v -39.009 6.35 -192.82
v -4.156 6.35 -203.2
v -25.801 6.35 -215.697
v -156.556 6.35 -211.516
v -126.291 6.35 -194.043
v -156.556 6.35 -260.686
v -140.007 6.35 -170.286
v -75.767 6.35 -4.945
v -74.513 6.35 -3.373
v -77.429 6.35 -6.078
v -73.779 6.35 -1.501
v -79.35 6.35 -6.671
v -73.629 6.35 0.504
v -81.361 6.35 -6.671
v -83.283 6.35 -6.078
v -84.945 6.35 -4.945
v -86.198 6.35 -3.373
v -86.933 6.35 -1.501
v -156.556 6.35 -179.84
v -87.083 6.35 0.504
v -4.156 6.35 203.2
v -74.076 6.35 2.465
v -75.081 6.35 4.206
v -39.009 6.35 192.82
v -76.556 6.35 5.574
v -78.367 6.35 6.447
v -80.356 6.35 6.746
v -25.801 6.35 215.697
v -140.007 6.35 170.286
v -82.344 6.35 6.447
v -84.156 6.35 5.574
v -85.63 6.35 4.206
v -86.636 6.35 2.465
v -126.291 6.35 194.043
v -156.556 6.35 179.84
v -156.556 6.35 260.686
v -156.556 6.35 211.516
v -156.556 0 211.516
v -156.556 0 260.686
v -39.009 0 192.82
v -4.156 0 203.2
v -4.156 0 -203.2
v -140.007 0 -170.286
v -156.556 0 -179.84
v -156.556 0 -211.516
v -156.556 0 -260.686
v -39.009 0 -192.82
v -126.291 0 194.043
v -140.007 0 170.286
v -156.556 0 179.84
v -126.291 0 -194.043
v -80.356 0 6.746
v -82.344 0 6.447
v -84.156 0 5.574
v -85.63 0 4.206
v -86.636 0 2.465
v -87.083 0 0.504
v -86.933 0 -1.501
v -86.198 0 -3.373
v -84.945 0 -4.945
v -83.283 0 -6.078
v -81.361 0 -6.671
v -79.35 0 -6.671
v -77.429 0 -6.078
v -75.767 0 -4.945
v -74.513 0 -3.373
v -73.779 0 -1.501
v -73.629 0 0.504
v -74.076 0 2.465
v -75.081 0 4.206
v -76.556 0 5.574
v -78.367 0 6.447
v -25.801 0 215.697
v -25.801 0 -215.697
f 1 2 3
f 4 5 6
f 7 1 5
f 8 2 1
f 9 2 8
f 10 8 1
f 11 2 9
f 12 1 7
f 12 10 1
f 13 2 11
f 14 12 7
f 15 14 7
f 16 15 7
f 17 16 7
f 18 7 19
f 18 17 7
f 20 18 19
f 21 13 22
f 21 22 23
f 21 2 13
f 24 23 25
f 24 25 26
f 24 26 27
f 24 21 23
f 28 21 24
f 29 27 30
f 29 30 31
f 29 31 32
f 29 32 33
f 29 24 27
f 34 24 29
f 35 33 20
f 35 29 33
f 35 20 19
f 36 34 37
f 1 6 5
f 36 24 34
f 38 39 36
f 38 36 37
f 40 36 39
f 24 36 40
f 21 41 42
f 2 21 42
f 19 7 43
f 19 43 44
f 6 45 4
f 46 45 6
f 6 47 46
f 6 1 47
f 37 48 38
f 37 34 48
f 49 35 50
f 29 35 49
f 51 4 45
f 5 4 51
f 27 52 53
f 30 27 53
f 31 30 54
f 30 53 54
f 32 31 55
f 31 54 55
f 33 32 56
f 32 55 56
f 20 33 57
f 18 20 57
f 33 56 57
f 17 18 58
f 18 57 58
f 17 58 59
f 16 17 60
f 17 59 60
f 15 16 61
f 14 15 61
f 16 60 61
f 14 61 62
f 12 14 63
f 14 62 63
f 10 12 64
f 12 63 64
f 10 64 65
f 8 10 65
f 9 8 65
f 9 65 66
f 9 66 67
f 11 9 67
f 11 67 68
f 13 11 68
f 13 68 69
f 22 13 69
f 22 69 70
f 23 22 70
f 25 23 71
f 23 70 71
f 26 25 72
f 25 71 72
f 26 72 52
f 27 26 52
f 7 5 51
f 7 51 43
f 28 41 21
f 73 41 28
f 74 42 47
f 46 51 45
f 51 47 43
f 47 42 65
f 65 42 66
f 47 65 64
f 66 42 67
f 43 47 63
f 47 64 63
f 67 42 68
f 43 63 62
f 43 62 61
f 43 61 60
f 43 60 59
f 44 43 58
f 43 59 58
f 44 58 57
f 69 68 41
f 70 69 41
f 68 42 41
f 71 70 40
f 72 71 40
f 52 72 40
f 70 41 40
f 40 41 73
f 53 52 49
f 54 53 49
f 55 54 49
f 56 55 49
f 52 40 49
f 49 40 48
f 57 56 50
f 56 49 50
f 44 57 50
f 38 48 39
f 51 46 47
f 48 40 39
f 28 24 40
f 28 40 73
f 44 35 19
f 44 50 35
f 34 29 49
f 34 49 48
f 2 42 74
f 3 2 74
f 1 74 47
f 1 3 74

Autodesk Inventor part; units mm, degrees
ref_plane "YZ Plane" through (0, 0, 0) normal (1, 0, 0) x (0, 1, 0)
ref_plane "XZ Plane" through (0, 0, 0) normal (0, 1, 0) x (-1, 0, 0)
ref_plane "XY Plane" through (0, 0, 0) normal (0, 0, 1) x (1, 0, 0)
sketch "Sketch1" plane through (0, 0, 0) normal (0, 1, 0) x (-1, 0, 0)
  line L0 (4.1559, 203.2) -> (4.1559, -203.2)
  line L1 (4.1559, -203.2) -> (156.5559, -291.1882)
  line L2 (4.1559, 203.2) -> (156.5559, 291.1882)
  line L3 (4.1559, 203.2) -> (180.1322, 203.2) construction
  line L4 (156.5559, 291.1882) -> (156.5559, -291.1882)
  point P0 (0, 0)
  point P1 (4.1559, 0)
  dimension "d0" = 120
  dimension "d1" = 30
  dimension "d2" = 406.4
  dimension "d5" = 152.4
extrude "Extrusion1" add sketch "Sketch1" along normal blind 6.35
sketch "Sketch4" plane through (0, 6.35, 0) normal (0, 1, 0) x (1, 0, 0)
  line L0 (-4.1559, -203.2) -> (-4.1559, 203.2) projected
  point P0 (0, 0)
  point P1 (-80.3559, 0)
  dimension "d12" = 76.2
  dimension "d13" = 203.2
hole "Hole1" at (-80.3559, 6.35, 0) direction (0, -1, 0) diameter 13.4925 end through all
sketch "Sketch5" plane through (0, 6.35, 0) normal (0, 1, 0) x (1, 0, 0)
  line L0 (-1271.2154, -905.4078) -> (-39.3808, -194.2078) projected
  line L1 (-1258.5154, -927.4048) -> (-1271.2154, -905.4078) projected
  line L2 (-1258.5154, -927.4048) -> (-26.6808, -216.2048) projected
  line L3 (-39.3808, -194.2078) -> (-26.6808, -216.2048) projected
  circle A0 centre (-1049.6741, -711.3284) radius 3.3782 projected
  circle A1 centre (-248.9471, -249.0284) radius 3.3782 projected
  circle A2 centre (-318.2291, -289.0284) radius 3.3782 projected
  circle A3 centre (-1118.9562, -751.3284) radius 3.3782 projected
  line L4 (-127.679, -193.6709) -> (-1227.5312, -828.6709) projected
  line L5 (-140.379, -171.6739) -> (-127.679, -193.6709) projected
  line L6 (-140.379, -171.6739) -> (-1240.2312, -806.6739) projected
  line L7 (-1227.5312, -828.6709) -> (-1240.2312, -806.6739) projected
  circle A4 centre (-318.2291, 289.0284) radius 3.3782 projected
  circle A5 centre (-1118.9562, 751.3284) radius 3.3782 projected
  circle A6 centre (-1049.6741, 711.3284) radius 3.3782 projected
  circle A7 centre (-248.9471, 249.0284) radius 3.3782 projected
  line L8 (-1227.5312, 828.6709) -> (-127.679, 193.6709) projected
  line L9 (-1240.2312, 806.6739) -> (-1227.5312, 828.6709) projected
  line L10 (-1240.2312, 806.6739) -> (-140.379, 171.6739) projected
  line L11 (-127.679, 193.6709) -> (-140.379, 171.6739) projected
  line L12 (-39.3808, 194.2078) -> (-1271.2154, 905.4078) projected
  line L13 (-26.6808, 216.2048) -> (-39.3808, 194.2078) projected
  line L14 (-26.6808, 216.2048) -> (-1258.5154, 927.4048) projected
  line L15 (-1271.2154, 905.4078) -> (-1258.5154, 927.4048) projected
  line L16 (-156.5559, -291.1882) -> (-26.6808, -216.2048)
  line L17 (-39.3808, -194.2078) -> (-156.5559, -261.8588)
  line L18 (-156.5559, 291.1882) -> (-156.5559, -291.1882) projected
  line L19 (-156.5559, -261.8588) -> (-156.5559, -291.1882)
  line L20 (-156.5559, -210.343) -> (-127.679, -193.6709)
  line L21 (-127.679, -193.6709) -> (-140.379, -171.6739)
  line L22 (-140.379, -171.6739) -> (-156.5559, -181.0136)
  line L23 (-156.5559, -181.0136) -> (-156.5559, -210.343)
  line L24 (-39.3808, -194.2078) -> (-26.6808, -216.2048)
  line L25 (-156.5559, 181.0136) -> (-140.379, 171.6739)
  line L26 (-140.379, 171.6739) -> (-127.679, 193.6709)
  line L27 (-127.679, 193.6709) -> (-156.5559, 210.343)
  line L28 (-156.5559, 210.343) -> (-156.5559, 181.0136)
  line L29 (-156.5559, 261.8588) -> (-39.3808, 194.2078)
  line L30 (-39.3808, 194.2078) -> (-26.6808, 216.2048)
  line L31 (-4.1559, 203.2) -> (-156.5559, 291.1882) projected
  line L32 (-26.6808, 216.2048) -> (-156.5559, 291.1882)
  line L33 (-156.5559, 291.1882) -> (-156.5559, 261.8588)
  line L34 (-156.5559, 291.1882) -> (-26.6808, 216.2048)
  line L35 (-25.293, -216.5767) -> (-157.5719, -292.9479)
  line L36 (-157.5719, -292.9479) -> (-157.5719, -261.2722)
  line L37 (-157.5719, -261.2722) -> (-39.009, -192.8199)
  line L38 (-39.009, -192.8199) -> (-25.293, -216.5767)
  line L39 (-126.2911, -194.0428) -> (-157.5719, -212.1027)
  line L40 (-157.5719, -212.1027) -> (-157.5719, -180.427)
  line L41 (-157.5719, -180.427) -> (-140.0071, -170.286)
  line L42 (-140.0071, -170.286) -> (-126.2911, -194.0428)
  line L43 (-140.0071, 170.286) -> (-157.5719, 180.427)
  line L44 (-157.5719, 180.427) -> (-157.5719, 212.1027)
  line L45 (-157.5719, 212.1027) -> (-126.2911, 194.0428)
  line L46 (-126.2911, 194.0428) -> (-140.0071, 170.286)
  line L47 (-25.801, 215.6968) -> (-39.009, 192.8199)
  line L48 (-39.009, 192.8199) -> (-157.5719, 261.2722)
  line L49 (-157.5719, 261.2722) -> (-157.5719, 291.1882)
  line L50 (-25.801, 215.6968) -> (-156.5559, 291.1882)
  line L51 (-157.5719, 291.1882) -> (-157.5719, 291.7748)
  line L52 (-157.5719, 291.7748) -> (-156.5559, 291.1882)
  point P0 (0, 0)
  dimension "d22" = 1.016
  dimension "d23" = 1.016
  dimension "d24" = 1.016
  dimension "d25" = 1.016
extrude "Extrusion3" cut sketch "Sketch5" against normal blind 25.4 contours L18 L37 L38 L35 L36 L2 L3 L0 | L18 L2 L36 L0 | L0 L3 L2 L18 | L0 L36 L37 L18 | L36 L2 L1 L0 | L48 L49 L12 L18 | L18 L12 L13 L31 L47 L48 | L43 L44 L10 L18 | L18 L10 L11 L8 L45 L46 L43 | L39 L40 L4 L18 | L18 L4 L5 L6 L41 L42 L39 | L18 L6 L5 L4 | L4 L40 L6 L18 | L4 L7 L6 L40 | L6 L40 L41 L18 | L18 L8 L11 L10 | L10 L44 L8 L18 | L10 L9 L8 L44 | L8 L44 L45 L18 | L18 L14 L13 L12 | L12 L49 L51 L14 L18 | A0 | A1 | A2 | A3 | A4 | A5 | A6 | A7
properties part number "Triangle End"
